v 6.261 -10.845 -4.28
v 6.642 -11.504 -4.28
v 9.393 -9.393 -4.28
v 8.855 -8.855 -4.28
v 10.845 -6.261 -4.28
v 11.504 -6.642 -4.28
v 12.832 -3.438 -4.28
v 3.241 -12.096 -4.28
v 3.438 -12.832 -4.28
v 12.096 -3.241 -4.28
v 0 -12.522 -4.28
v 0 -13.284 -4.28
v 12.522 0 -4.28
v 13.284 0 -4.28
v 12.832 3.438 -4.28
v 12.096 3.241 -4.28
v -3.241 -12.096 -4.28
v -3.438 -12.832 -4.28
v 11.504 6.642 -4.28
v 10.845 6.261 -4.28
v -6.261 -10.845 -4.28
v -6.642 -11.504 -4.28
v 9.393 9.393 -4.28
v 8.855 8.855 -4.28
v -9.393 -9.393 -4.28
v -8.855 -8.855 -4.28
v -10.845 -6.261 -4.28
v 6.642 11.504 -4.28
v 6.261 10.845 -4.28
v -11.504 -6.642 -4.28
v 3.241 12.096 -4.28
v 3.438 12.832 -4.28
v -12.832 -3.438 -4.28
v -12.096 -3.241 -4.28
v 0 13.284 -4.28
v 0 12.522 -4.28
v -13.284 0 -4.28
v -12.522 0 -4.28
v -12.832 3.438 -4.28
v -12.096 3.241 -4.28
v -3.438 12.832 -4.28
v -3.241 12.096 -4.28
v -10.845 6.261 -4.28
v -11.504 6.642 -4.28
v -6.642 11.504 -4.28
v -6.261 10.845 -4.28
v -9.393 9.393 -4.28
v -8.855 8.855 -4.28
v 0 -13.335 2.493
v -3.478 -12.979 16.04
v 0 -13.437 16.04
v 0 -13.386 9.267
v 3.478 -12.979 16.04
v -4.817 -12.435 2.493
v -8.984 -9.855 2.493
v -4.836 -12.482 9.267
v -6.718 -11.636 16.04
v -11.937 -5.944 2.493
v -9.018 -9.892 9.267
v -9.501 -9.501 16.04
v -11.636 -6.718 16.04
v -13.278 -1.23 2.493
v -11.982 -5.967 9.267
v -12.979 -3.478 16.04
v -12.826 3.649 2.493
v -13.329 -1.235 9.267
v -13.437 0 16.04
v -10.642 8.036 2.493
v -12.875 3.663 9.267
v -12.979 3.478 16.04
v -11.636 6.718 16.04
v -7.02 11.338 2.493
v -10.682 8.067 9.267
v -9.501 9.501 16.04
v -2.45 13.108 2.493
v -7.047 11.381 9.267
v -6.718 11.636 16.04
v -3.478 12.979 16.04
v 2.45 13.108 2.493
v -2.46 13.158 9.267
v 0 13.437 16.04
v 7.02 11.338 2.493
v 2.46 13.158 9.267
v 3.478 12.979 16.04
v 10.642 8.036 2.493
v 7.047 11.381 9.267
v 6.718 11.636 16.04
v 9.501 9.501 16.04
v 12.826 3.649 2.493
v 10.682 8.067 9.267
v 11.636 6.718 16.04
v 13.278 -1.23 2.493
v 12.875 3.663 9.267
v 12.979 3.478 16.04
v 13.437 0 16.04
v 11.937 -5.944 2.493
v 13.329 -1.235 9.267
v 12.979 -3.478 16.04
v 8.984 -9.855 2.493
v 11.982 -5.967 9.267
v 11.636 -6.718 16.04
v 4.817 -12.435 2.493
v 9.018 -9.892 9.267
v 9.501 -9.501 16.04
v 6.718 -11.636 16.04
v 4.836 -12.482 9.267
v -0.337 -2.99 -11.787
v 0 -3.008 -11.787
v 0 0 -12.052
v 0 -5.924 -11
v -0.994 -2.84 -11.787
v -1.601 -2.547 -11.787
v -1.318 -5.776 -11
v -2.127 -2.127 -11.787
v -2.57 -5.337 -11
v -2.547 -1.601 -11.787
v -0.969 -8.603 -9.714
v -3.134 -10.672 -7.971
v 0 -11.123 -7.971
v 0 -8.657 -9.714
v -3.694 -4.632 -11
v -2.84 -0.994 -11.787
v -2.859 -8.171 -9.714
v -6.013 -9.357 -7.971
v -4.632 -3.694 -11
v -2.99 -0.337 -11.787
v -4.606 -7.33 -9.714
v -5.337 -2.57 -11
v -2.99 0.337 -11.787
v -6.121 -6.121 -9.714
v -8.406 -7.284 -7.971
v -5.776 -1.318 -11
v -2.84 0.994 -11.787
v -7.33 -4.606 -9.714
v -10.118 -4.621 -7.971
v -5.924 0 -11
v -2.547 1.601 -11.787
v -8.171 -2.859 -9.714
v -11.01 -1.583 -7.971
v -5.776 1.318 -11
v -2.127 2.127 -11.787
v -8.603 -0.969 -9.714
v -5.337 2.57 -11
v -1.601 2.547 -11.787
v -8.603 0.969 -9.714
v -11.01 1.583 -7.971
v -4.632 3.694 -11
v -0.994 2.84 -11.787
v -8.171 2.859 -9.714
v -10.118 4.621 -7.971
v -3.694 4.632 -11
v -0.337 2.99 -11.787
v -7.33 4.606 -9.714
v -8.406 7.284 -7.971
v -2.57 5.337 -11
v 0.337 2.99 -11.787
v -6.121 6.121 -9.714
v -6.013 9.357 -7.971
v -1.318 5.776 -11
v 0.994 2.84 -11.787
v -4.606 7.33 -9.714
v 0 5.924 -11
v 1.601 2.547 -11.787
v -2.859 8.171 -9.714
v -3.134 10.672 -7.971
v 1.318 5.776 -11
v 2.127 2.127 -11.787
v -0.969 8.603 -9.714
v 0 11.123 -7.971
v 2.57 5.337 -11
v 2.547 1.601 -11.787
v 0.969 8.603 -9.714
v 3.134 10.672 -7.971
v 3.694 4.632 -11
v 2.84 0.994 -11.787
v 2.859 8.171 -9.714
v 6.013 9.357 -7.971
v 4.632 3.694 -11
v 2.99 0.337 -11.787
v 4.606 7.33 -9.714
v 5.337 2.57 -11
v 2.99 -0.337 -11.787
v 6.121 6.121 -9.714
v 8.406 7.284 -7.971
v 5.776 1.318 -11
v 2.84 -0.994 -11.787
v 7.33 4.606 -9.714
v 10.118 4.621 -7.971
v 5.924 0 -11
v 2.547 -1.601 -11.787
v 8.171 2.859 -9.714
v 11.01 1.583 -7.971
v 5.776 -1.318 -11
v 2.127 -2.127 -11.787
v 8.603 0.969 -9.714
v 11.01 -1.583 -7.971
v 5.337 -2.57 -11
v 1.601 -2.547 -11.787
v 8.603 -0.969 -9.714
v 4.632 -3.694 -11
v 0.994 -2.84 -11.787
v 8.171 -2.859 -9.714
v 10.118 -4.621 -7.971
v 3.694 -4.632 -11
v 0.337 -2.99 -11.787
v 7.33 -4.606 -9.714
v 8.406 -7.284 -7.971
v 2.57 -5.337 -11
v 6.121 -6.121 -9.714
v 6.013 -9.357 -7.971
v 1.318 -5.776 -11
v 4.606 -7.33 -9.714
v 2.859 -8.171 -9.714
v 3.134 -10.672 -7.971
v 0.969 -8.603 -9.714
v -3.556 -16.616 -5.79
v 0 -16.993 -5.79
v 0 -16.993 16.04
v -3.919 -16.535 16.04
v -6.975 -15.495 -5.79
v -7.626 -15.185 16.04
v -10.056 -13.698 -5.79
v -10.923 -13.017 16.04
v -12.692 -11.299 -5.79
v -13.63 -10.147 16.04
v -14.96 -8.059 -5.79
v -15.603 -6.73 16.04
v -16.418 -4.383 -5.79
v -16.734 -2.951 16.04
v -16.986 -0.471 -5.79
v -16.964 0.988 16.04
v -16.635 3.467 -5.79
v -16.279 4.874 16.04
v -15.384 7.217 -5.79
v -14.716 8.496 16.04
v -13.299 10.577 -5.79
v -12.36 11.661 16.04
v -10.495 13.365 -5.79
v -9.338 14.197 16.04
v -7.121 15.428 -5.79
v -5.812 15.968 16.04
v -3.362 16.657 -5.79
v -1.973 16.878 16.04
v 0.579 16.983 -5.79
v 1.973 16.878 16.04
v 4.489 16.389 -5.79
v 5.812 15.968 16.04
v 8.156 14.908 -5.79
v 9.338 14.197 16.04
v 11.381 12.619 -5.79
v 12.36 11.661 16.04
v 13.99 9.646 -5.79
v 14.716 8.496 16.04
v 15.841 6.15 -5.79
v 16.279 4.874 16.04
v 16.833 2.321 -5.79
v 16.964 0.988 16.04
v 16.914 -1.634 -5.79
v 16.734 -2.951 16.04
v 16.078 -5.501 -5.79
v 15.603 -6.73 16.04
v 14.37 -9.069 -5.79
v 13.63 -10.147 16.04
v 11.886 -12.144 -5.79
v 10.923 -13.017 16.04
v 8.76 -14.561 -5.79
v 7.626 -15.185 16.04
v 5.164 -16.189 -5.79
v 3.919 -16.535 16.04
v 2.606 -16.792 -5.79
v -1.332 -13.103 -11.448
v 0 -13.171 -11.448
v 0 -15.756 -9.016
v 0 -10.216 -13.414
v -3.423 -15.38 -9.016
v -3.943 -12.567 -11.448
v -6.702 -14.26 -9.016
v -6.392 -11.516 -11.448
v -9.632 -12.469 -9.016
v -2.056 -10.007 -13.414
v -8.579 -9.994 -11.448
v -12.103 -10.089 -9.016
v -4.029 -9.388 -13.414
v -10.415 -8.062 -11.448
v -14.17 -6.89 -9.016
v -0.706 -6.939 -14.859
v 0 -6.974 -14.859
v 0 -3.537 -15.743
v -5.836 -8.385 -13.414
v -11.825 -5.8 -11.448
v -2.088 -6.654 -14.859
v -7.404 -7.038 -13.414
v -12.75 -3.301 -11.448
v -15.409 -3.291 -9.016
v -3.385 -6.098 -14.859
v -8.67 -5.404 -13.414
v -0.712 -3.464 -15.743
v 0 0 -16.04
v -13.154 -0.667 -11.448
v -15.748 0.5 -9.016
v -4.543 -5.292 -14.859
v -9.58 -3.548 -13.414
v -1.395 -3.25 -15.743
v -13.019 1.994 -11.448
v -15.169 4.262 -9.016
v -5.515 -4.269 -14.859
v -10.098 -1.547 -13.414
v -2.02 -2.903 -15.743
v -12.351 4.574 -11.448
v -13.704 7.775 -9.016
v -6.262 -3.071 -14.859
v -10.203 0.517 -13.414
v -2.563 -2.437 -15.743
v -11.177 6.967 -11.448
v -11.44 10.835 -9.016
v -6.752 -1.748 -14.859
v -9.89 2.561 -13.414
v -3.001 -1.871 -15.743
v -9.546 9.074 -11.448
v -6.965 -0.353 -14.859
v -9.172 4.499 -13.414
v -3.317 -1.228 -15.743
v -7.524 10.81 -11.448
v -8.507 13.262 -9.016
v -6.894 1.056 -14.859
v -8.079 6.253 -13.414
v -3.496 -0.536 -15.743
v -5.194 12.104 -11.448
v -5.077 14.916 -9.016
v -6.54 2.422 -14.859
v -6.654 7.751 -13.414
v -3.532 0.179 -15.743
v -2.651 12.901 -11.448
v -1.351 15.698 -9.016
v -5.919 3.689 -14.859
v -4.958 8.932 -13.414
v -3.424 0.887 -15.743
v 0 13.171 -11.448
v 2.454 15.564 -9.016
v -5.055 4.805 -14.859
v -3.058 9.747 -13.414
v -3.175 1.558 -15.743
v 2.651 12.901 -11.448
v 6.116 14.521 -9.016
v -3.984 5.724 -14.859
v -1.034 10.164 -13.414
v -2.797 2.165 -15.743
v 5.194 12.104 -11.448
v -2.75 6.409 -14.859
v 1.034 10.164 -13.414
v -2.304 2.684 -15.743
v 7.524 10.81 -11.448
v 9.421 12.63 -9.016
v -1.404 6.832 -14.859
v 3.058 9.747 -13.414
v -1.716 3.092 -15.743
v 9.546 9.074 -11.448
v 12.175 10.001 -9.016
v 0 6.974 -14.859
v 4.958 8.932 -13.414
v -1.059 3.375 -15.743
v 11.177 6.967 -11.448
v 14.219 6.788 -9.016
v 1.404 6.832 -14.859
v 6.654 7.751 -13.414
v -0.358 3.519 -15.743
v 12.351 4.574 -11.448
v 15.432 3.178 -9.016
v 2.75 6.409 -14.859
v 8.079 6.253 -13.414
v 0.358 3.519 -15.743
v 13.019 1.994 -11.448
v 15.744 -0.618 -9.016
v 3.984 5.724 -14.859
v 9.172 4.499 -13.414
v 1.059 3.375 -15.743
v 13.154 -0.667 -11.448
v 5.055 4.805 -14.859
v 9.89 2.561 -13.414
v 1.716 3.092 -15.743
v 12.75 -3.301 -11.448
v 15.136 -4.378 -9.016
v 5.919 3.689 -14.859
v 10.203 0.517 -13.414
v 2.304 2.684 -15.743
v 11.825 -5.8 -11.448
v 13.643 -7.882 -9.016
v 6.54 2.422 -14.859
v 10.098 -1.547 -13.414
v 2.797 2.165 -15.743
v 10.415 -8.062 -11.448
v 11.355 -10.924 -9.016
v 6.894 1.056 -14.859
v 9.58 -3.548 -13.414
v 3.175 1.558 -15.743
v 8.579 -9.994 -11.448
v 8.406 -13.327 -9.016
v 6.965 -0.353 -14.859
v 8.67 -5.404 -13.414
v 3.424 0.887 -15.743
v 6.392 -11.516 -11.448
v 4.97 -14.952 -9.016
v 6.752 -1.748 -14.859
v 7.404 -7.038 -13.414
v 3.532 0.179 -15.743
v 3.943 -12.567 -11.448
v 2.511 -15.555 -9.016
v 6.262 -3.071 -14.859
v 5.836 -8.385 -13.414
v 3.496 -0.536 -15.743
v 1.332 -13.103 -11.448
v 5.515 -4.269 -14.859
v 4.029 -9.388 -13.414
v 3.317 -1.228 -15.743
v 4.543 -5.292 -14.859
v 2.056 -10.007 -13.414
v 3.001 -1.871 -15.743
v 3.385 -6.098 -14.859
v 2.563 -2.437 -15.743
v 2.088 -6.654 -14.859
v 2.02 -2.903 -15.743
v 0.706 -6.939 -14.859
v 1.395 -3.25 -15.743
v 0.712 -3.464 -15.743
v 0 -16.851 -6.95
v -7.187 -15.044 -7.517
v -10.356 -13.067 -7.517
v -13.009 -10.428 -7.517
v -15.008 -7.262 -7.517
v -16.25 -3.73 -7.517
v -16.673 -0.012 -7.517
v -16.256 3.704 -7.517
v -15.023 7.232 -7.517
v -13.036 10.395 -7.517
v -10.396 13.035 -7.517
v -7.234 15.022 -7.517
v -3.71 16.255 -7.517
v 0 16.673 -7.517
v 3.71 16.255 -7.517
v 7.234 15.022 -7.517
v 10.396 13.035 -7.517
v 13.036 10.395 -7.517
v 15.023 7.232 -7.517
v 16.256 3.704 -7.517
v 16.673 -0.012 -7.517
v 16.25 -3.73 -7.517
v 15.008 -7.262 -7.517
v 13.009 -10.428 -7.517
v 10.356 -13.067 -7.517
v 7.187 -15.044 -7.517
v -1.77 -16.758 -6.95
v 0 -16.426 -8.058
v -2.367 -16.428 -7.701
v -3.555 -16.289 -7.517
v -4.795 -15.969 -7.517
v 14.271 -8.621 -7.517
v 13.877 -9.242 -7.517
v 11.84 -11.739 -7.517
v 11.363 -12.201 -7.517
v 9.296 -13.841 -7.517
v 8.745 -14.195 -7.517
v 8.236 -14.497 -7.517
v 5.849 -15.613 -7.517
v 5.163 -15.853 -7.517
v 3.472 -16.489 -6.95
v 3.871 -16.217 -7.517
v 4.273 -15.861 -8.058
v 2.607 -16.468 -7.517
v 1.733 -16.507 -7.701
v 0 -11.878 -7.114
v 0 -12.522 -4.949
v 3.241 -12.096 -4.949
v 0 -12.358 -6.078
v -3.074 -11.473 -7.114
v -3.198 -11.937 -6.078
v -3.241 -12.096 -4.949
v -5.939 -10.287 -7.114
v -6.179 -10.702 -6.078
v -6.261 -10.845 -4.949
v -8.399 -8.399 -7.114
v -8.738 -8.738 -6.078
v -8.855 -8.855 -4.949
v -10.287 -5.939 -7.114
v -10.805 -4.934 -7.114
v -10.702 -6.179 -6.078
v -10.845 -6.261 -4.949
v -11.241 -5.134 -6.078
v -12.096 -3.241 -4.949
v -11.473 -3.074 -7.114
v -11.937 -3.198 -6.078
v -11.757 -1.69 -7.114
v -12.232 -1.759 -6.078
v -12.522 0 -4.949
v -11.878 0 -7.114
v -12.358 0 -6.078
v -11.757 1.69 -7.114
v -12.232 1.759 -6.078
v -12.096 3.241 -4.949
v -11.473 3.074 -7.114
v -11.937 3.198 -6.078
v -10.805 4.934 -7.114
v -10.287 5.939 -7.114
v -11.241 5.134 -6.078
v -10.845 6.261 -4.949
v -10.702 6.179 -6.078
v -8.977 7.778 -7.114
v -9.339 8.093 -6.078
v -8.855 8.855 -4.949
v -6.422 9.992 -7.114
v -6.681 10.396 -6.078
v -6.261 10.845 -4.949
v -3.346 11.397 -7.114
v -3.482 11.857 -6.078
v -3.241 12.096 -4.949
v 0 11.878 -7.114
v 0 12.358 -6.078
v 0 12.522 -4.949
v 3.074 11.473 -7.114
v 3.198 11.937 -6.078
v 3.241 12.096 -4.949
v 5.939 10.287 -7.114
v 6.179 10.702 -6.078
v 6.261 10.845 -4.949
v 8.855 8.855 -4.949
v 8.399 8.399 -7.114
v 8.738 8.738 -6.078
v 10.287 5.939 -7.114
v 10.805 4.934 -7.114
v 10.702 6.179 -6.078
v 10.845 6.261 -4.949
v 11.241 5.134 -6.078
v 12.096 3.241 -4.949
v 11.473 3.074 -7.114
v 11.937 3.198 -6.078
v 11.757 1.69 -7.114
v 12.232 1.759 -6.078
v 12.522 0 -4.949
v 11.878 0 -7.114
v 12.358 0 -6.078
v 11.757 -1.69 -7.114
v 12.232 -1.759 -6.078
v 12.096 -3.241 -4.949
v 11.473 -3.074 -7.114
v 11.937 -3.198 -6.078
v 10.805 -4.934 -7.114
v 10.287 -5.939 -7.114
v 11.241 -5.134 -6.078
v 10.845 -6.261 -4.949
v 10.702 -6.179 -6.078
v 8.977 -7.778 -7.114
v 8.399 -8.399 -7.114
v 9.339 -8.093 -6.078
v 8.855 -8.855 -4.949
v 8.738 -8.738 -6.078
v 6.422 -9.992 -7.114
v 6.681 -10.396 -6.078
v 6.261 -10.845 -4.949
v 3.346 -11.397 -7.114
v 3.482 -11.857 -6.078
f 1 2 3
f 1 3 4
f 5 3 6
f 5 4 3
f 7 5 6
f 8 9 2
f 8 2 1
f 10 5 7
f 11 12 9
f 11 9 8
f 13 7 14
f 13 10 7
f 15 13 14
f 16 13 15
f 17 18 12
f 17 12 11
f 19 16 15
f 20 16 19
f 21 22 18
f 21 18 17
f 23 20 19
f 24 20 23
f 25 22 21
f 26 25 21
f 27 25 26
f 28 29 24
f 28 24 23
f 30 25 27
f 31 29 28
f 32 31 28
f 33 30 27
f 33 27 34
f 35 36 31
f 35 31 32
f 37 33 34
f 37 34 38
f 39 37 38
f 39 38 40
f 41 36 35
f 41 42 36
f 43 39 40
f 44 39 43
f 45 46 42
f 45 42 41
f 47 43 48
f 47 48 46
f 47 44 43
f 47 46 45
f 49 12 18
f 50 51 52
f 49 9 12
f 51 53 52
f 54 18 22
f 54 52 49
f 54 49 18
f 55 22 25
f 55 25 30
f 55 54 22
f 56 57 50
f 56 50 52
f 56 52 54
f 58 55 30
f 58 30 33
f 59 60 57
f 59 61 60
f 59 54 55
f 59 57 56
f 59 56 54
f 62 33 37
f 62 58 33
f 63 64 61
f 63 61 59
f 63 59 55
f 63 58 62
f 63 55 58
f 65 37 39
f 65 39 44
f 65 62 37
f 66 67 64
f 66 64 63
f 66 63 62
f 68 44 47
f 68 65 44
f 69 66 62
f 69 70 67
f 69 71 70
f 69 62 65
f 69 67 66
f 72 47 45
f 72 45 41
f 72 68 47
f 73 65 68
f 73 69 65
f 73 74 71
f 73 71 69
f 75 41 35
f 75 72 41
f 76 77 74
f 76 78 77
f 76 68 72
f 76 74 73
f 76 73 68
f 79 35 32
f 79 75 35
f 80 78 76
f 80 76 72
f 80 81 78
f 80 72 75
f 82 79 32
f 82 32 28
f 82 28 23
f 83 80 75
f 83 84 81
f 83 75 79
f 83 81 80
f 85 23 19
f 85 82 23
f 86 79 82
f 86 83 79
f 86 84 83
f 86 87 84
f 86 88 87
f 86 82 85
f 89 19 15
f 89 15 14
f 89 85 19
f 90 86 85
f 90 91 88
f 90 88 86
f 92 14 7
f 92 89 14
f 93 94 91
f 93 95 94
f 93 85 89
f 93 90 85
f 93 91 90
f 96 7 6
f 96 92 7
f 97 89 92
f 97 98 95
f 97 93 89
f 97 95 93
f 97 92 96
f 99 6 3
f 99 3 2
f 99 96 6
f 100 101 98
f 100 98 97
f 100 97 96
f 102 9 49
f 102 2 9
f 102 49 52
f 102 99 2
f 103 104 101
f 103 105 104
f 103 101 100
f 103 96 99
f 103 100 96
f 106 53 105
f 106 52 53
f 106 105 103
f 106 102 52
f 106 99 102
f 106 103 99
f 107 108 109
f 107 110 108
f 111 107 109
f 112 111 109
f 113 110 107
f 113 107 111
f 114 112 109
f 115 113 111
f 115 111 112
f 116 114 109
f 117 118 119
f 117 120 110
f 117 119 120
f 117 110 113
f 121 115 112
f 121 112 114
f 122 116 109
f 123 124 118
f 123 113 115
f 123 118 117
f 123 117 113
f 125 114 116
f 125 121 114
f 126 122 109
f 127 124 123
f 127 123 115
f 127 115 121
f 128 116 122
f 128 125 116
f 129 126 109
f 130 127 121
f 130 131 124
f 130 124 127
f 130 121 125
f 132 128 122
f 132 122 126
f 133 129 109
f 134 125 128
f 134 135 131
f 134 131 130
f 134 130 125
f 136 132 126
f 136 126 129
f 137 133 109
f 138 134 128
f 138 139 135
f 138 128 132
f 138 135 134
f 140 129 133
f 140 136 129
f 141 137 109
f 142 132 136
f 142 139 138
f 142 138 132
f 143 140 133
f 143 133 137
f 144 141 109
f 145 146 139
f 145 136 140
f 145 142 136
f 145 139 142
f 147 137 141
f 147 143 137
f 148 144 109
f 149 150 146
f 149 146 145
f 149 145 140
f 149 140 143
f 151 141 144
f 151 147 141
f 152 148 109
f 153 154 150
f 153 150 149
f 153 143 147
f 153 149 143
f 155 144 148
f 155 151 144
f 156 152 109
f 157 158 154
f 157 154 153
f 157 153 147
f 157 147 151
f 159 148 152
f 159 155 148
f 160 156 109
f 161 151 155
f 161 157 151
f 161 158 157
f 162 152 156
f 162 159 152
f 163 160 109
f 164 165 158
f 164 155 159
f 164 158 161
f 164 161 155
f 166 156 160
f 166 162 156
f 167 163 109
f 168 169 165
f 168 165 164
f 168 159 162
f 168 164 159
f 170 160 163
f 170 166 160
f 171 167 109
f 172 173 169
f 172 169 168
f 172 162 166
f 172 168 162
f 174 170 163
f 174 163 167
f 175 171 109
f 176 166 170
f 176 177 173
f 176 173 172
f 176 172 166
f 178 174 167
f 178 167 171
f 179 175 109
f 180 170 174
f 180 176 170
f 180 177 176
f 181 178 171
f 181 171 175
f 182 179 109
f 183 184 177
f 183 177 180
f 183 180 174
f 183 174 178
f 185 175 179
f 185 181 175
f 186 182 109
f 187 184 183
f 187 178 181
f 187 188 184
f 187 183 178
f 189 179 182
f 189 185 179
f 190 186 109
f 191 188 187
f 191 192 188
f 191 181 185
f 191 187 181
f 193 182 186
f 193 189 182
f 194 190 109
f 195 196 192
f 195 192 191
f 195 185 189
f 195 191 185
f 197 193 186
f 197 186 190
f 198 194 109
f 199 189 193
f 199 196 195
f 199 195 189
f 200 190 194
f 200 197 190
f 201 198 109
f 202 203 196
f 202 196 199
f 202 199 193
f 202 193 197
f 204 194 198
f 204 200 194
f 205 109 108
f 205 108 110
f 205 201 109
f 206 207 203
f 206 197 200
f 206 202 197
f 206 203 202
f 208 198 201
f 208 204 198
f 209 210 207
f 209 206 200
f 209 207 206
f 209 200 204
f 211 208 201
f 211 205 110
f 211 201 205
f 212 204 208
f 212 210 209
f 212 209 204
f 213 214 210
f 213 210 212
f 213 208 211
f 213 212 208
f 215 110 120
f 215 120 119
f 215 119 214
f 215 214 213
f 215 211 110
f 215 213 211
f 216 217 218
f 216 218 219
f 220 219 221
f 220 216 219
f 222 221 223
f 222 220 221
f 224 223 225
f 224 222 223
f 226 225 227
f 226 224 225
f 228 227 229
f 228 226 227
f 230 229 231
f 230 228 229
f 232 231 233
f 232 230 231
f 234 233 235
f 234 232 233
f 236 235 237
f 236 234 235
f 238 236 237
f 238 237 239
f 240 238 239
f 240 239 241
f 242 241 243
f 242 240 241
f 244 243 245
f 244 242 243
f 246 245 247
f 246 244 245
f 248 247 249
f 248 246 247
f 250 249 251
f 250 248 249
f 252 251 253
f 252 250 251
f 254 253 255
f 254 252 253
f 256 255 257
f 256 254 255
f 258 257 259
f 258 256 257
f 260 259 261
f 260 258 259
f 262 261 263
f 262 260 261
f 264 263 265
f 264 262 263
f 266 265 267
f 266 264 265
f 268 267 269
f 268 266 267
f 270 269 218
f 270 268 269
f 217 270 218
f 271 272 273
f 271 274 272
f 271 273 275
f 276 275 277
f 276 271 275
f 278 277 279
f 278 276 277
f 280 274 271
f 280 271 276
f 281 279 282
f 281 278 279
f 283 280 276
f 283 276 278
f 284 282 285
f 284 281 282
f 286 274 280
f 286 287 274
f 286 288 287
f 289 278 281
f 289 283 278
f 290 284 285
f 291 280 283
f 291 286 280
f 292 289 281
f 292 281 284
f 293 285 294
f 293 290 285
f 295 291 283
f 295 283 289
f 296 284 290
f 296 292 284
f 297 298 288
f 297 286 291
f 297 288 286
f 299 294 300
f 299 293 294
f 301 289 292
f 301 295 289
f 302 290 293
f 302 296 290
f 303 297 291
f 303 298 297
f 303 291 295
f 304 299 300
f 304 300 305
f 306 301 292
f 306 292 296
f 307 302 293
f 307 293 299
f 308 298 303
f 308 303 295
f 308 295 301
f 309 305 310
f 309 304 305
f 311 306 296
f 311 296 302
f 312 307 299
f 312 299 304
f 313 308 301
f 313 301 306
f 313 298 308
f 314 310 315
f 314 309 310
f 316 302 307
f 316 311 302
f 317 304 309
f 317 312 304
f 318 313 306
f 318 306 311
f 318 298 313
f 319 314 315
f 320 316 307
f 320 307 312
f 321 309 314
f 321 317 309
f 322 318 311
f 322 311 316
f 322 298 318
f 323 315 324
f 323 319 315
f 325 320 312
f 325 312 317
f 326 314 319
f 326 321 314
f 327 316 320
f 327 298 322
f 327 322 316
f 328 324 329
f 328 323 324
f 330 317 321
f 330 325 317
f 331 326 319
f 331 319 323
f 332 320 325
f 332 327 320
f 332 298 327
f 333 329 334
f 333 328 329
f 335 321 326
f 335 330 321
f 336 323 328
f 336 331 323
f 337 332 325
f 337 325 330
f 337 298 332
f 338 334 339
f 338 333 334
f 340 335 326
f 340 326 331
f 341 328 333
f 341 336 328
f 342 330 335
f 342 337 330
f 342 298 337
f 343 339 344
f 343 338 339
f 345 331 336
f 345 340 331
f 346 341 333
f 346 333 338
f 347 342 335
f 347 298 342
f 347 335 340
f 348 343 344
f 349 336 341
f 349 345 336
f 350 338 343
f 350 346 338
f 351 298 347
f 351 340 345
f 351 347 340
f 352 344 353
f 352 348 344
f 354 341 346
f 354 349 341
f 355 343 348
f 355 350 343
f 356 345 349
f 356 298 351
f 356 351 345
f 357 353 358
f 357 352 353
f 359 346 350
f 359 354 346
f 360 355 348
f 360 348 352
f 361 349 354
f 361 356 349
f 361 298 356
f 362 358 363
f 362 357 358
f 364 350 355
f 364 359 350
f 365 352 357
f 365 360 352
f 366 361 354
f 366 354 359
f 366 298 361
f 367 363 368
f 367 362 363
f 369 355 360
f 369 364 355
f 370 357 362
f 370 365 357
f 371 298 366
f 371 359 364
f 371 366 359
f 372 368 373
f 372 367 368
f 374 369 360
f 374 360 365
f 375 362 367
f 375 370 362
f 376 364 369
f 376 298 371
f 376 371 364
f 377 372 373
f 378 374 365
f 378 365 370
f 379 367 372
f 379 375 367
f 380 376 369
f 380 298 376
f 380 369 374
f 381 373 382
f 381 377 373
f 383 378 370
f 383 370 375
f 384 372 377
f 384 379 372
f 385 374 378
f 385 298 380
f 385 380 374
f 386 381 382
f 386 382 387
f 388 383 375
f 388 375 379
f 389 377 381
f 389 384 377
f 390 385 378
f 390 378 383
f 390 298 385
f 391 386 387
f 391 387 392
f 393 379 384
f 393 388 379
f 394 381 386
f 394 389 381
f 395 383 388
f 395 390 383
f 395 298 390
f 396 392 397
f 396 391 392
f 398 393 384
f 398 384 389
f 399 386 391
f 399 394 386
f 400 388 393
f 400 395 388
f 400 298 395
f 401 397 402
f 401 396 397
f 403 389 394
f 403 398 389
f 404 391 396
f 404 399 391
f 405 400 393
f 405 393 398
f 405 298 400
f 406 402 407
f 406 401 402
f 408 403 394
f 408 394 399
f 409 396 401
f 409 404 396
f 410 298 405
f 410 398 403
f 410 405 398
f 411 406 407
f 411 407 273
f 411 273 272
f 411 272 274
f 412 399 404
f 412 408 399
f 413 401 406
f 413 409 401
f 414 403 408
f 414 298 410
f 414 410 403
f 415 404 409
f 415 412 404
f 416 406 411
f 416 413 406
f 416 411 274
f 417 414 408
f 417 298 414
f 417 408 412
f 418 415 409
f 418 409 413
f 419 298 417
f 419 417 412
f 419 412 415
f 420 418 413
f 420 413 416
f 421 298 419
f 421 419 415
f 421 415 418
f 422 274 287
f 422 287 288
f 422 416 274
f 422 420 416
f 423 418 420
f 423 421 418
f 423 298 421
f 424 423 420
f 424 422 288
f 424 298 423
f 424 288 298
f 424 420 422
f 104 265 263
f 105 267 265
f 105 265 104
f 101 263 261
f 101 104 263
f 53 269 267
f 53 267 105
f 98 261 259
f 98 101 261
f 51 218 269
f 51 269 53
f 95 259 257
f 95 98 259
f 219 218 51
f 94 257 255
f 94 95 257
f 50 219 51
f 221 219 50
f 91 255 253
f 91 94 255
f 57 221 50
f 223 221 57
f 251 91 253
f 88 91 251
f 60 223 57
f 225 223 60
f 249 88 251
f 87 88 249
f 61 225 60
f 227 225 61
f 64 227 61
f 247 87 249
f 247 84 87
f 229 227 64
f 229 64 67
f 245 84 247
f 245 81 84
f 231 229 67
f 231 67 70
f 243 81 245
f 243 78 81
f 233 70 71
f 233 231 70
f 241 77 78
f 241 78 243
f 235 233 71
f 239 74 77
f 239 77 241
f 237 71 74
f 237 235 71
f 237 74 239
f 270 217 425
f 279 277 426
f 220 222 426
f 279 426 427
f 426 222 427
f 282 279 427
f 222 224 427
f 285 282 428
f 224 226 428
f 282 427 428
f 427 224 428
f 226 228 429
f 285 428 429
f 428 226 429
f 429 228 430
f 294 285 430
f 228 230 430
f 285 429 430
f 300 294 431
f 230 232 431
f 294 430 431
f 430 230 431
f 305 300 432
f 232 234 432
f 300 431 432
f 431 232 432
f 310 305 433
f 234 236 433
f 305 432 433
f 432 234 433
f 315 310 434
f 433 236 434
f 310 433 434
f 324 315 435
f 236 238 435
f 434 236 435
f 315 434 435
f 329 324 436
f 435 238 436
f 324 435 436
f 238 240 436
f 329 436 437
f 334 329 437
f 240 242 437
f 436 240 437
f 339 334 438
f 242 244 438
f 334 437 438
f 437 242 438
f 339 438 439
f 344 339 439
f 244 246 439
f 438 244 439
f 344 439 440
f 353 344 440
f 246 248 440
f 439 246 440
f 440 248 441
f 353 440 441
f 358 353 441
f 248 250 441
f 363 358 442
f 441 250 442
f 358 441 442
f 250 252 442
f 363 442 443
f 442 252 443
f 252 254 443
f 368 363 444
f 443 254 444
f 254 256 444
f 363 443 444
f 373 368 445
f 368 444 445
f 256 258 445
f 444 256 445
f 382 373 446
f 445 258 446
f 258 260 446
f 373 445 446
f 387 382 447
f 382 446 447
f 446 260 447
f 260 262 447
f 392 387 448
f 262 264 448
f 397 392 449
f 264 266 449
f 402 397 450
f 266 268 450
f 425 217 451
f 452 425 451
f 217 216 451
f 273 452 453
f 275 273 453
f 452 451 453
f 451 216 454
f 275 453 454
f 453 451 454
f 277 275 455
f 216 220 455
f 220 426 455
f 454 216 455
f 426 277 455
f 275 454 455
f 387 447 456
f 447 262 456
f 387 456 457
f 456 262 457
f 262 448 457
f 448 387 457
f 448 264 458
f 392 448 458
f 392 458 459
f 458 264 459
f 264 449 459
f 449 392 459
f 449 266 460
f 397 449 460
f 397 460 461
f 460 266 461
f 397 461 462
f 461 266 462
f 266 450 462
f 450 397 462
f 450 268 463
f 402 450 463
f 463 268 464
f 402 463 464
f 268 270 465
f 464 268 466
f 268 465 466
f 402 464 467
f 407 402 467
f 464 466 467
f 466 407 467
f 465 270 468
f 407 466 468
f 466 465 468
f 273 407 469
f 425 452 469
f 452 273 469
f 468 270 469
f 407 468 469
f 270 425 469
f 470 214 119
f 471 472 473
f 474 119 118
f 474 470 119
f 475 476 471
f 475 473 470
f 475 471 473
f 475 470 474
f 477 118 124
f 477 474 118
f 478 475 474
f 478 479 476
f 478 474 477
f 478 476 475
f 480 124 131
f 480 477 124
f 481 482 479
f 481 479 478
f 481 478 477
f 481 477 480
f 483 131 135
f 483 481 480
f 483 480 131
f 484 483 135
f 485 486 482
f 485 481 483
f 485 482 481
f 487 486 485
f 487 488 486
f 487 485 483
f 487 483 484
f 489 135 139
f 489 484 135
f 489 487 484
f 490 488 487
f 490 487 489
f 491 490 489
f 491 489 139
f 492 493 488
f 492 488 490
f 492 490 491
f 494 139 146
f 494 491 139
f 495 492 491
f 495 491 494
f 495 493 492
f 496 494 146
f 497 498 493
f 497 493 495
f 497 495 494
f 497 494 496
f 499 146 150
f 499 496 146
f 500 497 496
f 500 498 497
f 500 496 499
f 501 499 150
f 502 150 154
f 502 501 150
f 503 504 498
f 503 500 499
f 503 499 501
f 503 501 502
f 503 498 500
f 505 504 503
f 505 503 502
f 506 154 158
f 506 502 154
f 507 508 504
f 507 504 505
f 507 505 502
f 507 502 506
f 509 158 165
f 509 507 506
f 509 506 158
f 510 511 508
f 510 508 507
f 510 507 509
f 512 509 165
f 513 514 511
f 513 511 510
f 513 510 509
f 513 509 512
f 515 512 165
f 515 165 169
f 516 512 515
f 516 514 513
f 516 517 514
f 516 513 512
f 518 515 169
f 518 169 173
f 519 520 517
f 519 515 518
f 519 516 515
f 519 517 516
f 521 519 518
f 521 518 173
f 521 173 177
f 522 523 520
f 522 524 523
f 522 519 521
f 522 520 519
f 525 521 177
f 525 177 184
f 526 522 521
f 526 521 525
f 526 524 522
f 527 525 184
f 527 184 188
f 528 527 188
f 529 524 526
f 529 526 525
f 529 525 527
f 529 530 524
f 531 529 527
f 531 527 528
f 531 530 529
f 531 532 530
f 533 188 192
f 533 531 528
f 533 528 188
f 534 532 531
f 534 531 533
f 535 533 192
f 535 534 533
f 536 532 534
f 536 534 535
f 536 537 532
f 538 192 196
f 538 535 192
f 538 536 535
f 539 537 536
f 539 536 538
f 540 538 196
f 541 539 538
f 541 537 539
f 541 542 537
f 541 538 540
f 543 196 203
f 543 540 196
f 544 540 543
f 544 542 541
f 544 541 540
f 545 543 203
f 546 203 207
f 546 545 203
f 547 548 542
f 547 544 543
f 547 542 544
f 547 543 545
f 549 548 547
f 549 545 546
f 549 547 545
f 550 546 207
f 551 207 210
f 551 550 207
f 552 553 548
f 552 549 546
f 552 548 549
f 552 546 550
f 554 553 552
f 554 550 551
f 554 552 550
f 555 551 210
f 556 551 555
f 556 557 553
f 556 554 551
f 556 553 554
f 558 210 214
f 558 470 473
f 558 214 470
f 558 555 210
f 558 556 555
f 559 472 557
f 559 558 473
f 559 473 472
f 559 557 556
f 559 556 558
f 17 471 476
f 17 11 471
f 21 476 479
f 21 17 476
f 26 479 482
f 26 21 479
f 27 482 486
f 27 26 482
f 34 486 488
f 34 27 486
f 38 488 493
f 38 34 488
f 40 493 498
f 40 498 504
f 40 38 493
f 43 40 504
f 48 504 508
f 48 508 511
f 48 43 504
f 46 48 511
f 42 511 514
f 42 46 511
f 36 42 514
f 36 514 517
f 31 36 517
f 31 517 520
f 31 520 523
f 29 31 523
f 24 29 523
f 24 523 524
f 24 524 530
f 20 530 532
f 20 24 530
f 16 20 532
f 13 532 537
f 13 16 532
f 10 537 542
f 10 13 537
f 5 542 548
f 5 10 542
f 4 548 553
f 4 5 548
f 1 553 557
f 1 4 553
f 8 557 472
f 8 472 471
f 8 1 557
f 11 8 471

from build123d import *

# Parameters (mm, degrees)
FILLET1_R = 4.826


with BuildPart() as part:
    # Sketch2 → Revolve1 (revolve)
    with BuildSketch(Plane(origin=(0, 0, 0), x_dir=(0, 0, -1), z_dir=(1, 0, 0))):
        with BuildLine():
            Line((-16.0401, -13.4366), (-16.0401, -16.9926))
            Line((-16.0401, -16.9926), (7.50547048, -16.9926))
            ThreePointArc((7.50547048, -16.9926), (13.786577126, -9.507738372), (16.0401, 0))
            Line((16.0401, 0), (12.0523, 0))
            ThreePointArc((12.0523, 0), (10.999645869, -5.924050901), (7.970561543, -11.122811132))
            ThreePointArc((7.970561543, -11.122811132), (6.613783182, -12.155372908), (4.948709843, -12.5222))
            Line((4.948709843, -12.5222), (4.2799, -12.5222))
            Line((4.2799, -12.5222), (4.2799, -13.2842))
            Line((4.2799, -13.2842), (-16.0401, -13.4366))
        make_face()
    revolve(axis=Axis((0, 0, 16.0401), (0, 0, -1)))

    # Fillet1
    fillet1_edges = [part.edges().sort_by_distance(p)[0] for p in [
        (0, 16.9926, -7.50547048),
    ]]
    fillet(fillet1_edges, radius=FILLET1_R)


solid = part.part
